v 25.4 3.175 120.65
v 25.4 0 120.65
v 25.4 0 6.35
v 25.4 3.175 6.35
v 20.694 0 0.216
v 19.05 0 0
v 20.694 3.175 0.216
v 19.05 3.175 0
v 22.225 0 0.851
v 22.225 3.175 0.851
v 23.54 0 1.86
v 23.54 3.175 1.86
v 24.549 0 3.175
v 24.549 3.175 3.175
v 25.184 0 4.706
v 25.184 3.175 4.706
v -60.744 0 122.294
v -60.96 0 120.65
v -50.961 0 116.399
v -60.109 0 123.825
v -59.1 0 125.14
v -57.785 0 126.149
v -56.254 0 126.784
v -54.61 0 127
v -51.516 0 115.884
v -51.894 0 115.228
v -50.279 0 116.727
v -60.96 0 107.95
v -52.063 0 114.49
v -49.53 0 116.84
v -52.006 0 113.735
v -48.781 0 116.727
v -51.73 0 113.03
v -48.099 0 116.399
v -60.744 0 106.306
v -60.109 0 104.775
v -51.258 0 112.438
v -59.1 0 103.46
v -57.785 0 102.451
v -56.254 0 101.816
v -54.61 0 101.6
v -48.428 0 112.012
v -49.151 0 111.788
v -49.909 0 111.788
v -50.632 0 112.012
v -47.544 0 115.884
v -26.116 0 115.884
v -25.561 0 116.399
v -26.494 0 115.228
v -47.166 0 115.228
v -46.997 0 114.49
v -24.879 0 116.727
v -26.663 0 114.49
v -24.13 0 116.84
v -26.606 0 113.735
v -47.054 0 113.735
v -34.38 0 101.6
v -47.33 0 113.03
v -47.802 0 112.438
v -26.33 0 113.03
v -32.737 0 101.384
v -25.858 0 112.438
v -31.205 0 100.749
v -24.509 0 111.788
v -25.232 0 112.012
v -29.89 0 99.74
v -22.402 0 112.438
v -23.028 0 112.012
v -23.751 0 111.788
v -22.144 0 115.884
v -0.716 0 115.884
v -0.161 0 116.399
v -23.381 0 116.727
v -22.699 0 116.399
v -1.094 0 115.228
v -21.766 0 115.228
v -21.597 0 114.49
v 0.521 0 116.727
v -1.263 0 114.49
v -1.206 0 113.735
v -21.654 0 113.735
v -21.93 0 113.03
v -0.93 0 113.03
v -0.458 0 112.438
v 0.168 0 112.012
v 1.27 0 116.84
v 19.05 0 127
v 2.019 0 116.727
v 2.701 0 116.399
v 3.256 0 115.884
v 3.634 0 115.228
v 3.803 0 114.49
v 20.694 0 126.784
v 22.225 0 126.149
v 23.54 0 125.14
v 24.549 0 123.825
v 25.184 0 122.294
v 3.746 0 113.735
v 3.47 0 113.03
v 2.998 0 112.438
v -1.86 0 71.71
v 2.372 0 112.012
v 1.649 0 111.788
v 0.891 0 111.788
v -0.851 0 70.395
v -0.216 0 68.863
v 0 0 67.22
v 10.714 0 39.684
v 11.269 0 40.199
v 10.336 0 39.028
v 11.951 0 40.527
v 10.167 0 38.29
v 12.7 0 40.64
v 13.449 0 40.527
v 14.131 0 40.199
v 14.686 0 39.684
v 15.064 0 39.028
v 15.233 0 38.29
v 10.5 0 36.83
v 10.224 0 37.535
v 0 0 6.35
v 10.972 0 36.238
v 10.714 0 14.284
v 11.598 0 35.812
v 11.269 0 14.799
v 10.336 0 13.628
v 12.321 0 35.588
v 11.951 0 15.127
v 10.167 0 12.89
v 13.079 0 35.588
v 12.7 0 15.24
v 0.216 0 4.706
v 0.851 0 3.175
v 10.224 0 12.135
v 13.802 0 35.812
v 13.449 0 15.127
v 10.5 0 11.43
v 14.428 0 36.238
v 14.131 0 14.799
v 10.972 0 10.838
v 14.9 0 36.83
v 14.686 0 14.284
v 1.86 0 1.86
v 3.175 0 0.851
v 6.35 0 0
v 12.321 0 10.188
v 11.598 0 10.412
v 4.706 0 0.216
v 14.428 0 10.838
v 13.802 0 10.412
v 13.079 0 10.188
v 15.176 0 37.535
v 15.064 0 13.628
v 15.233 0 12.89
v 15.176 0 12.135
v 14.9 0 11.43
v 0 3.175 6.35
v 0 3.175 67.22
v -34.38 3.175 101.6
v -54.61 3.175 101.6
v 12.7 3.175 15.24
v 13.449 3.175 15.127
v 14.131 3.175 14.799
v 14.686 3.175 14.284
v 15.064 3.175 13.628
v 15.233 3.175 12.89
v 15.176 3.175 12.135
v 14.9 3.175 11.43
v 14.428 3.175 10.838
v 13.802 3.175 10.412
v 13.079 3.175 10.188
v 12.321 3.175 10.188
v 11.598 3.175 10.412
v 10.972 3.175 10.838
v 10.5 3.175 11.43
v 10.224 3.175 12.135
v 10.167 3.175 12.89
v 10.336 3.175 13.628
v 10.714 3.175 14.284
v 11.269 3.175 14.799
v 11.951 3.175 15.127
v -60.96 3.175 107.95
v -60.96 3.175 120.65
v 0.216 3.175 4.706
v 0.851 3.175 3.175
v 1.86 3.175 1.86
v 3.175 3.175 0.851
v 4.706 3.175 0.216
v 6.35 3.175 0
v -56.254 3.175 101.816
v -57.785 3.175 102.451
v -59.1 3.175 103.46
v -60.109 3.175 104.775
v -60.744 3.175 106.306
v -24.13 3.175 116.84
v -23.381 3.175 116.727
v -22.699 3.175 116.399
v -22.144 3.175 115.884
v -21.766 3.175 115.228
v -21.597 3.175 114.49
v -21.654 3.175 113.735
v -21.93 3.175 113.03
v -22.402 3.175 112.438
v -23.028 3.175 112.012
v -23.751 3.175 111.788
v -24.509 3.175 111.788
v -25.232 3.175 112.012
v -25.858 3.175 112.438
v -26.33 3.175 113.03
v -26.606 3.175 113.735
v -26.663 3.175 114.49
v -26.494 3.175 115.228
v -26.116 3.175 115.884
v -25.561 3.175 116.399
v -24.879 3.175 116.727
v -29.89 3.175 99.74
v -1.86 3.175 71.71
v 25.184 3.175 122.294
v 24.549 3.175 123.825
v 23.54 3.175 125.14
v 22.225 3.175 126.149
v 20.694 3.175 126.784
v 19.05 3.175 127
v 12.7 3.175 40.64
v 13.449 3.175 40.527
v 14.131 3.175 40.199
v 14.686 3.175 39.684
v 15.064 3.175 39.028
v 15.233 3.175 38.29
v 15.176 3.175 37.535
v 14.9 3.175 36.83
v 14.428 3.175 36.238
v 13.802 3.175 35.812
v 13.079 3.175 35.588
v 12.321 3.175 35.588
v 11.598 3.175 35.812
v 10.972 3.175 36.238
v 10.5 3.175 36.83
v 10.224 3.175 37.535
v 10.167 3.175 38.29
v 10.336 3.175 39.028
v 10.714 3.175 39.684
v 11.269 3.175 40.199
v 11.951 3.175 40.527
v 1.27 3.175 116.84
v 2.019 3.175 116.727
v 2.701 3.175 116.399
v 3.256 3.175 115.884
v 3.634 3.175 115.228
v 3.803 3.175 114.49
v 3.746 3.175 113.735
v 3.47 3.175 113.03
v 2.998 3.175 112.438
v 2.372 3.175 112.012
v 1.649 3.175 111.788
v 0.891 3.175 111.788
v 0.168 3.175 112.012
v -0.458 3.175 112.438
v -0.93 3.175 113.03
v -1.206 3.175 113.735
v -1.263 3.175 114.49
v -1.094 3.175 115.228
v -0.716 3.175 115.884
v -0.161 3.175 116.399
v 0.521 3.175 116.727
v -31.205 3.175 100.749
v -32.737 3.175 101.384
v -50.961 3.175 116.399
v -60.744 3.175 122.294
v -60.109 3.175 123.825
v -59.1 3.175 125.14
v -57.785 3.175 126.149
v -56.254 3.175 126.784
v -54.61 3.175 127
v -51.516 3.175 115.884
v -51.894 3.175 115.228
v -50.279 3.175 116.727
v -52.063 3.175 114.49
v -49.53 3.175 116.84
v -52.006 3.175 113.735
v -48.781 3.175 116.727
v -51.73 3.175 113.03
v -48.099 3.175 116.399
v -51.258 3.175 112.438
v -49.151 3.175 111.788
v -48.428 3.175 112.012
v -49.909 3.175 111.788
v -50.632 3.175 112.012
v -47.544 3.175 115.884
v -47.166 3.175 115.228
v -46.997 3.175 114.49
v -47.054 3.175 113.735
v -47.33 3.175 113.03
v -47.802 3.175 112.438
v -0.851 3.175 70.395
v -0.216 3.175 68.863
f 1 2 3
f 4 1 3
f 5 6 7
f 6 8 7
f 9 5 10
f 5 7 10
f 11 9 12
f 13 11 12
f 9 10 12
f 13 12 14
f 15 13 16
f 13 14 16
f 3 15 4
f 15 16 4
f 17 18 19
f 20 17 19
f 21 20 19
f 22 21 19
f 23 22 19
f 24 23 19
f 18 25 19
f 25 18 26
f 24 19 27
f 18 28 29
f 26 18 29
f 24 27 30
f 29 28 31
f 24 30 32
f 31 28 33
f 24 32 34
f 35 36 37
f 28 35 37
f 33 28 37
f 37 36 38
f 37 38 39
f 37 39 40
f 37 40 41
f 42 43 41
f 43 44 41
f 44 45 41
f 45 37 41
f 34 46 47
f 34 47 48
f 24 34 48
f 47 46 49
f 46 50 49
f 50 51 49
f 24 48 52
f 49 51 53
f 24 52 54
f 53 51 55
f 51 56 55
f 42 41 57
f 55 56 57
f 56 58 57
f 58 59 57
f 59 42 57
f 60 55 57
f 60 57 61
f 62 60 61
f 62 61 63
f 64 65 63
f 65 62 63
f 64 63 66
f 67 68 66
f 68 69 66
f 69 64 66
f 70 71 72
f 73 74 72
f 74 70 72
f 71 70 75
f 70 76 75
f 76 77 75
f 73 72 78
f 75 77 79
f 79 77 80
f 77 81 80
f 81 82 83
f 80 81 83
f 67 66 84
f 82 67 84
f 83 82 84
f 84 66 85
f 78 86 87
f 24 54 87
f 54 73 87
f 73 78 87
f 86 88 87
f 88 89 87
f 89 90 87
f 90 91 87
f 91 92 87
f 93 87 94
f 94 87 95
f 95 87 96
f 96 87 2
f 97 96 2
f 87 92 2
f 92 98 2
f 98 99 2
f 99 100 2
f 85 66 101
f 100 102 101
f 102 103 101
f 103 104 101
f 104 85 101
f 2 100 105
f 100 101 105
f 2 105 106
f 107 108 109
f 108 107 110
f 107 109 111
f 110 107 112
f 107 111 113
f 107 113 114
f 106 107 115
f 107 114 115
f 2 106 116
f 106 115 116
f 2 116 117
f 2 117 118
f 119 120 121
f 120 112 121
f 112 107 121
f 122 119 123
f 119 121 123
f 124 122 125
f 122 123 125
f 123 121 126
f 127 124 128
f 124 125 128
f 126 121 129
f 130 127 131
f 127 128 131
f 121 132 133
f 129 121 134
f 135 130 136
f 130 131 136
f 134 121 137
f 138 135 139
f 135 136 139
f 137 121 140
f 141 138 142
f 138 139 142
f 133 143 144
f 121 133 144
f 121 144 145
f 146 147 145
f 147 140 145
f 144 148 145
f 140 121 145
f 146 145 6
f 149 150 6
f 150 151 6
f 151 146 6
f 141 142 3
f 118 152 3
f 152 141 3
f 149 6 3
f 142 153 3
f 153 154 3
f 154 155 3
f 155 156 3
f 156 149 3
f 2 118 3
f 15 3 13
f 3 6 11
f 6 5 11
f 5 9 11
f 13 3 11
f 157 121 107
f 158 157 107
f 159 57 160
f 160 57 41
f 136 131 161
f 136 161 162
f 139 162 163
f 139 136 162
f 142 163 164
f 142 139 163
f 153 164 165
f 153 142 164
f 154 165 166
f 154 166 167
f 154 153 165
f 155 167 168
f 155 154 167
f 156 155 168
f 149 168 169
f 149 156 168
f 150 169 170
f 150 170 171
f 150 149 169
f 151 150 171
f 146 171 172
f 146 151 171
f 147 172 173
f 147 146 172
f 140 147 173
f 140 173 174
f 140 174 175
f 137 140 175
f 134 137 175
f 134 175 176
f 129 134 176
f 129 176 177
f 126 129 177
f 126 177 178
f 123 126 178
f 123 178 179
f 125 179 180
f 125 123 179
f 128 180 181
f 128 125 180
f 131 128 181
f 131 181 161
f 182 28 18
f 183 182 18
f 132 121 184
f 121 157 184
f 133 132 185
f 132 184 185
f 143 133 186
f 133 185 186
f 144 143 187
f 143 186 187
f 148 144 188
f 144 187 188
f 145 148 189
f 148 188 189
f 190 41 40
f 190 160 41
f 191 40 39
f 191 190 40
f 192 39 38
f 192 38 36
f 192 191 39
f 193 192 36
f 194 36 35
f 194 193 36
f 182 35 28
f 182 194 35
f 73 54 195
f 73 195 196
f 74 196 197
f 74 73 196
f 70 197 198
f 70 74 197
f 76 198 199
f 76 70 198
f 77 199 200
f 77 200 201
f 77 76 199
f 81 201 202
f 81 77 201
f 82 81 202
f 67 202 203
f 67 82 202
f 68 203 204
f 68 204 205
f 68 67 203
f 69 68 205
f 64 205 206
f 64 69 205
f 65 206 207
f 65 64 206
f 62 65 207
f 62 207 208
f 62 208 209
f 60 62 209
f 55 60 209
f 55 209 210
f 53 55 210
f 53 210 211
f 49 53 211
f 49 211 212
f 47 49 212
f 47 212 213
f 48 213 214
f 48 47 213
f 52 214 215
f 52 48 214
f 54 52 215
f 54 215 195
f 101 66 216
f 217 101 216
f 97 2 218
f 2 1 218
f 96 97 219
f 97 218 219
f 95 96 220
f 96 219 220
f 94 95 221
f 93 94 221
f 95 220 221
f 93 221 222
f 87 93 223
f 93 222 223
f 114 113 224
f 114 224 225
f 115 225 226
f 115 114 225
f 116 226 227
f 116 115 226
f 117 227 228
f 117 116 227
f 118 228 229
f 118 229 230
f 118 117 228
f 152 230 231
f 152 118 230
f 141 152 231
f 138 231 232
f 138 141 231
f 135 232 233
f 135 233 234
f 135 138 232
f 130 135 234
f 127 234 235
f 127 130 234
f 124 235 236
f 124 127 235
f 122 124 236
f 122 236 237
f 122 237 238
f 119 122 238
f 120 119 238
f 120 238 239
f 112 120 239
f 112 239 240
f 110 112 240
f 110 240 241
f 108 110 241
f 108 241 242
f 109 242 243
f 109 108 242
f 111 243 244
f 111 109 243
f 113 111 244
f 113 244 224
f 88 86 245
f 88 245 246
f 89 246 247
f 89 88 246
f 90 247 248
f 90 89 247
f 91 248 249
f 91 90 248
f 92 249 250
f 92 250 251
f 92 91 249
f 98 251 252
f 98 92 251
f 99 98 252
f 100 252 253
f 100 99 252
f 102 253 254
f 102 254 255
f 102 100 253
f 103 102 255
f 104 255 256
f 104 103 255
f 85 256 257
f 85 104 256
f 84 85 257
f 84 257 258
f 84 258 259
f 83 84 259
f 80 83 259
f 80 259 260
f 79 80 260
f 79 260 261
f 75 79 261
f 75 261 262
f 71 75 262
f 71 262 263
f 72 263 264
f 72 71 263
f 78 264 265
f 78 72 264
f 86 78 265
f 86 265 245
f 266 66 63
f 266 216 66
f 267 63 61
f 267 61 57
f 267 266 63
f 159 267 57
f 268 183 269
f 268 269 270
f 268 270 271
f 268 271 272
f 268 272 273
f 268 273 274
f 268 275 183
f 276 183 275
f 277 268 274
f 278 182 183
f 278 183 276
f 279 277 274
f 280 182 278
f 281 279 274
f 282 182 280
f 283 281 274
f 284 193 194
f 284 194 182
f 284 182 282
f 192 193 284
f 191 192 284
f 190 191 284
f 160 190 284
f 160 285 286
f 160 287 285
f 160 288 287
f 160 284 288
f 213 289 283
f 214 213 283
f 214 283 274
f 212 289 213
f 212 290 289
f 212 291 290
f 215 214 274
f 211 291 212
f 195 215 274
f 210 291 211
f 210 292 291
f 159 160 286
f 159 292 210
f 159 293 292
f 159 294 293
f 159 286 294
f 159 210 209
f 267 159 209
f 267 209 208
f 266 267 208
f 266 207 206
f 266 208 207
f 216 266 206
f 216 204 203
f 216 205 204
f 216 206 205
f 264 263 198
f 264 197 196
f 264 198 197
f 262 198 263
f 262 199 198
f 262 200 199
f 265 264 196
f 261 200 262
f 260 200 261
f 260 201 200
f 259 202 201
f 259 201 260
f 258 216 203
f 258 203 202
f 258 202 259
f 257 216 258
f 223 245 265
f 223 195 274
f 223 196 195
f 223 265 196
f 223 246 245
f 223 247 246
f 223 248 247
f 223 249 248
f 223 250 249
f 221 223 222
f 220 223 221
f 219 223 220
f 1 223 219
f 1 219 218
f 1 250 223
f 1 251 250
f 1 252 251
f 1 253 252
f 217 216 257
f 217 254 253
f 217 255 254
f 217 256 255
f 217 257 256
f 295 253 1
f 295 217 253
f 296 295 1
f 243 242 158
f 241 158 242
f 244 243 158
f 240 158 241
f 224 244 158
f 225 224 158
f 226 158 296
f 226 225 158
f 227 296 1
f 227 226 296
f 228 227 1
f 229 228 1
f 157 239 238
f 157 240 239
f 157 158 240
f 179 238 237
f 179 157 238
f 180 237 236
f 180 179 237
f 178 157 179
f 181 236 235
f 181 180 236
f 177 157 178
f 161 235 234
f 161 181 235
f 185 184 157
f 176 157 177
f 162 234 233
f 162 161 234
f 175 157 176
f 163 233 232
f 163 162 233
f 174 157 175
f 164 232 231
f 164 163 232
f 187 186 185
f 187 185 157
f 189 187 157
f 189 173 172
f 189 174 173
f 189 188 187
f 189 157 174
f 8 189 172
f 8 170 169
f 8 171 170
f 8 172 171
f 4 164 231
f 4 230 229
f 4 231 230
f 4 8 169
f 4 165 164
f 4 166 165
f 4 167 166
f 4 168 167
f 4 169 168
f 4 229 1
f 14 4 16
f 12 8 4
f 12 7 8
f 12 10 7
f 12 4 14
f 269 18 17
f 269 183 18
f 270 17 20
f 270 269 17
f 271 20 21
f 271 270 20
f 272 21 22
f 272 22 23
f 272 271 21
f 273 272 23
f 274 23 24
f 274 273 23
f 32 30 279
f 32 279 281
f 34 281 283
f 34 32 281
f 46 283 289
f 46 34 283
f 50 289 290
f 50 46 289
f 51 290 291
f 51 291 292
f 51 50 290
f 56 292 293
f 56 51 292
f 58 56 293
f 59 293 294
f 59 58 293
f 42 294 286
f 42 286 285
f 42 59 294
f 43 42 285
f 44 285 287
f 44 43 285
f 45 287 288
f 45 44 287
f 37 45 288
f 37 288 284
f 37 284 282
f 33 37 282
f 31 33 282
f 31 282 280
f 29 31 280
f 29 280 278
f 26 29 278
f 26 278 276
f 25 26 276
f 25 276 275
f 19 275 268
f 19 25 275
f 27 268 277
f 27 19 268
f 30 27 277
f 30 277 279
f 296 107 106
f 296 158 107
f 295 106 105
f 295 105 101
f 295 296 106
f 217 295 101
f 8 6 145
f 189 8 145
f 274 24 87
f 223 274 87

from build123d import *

# Parameters (mm, degrees)
SKETCH1_R           = 2.54
BOSS_EXTRUDE1_DEPTH = 3.175
CHAMFER1_SIZE       = 31.75
FILLET1_R           = 6.35


with BuildPart() as part:
    # Sketch1 → Boss-Extrude1 (new body)
    with BuildSketch(Plane(origin=(0, 0, 0), x_dir=(1, 0, 0), z_dir=(0, 1, 0))):
        Polygon((25.4, 0), (0, 0), (0, -101.6), (-60.96, -101.6), (-60.96, -127), (25.4, -127), align=None)
        with Locations(Location((1.27, -114.3, 0), (0, 0, 270))):
            Circle(SKETCH1_R, mode=Mode.SUBTRACT)
        with Locations(Location((12.7, -12.7, 0), (0, 0, 270))):
            Circle(SKETCH1_R, mode=Mode.SUBTRACT)
        with Locations(Location((12.7, -38.1, 0), (0, 0, 270))):
            Circle(SKETCH1_R, mode=Mode.SUBTRACT)
        with Locations(Location((-24.13, -114.3, 0), (0, 0, 270))):
            Circle(SKETCH1_R, mode=Mode.SUBTRACT)
        with Locations(Location((-49.53, -114.3, 0), (0, 0, 270))):
            Circle(SKETCH1_R, mode=Mode.SUBTRACT)
    extrude(amount=BOSS_EXTRUDE1_DEPTH)

    # Chamfer1
    chamfer1_edges = [part.edges().sort_by_distance(p)[0] for p in [
        (0, 1.5875, 101.6),
    ]]
    chamfer(chamfer1_edges, length=CHAMFER1_SIZE)

    # Fillet1
    fillet1_edges = [part.edges().sort_by_distance(p)[0] for p in [
        (-60.96, 1.5875, 101.6),
        (0, 1.5875, 0),
        (25.4, 1.5875, 0),
        (25.4, 1.5875, 127),
        (-60.96, 1.5875, 127),
        (-31.75, 1.5875, 101.6),
        (0, 1.5875, 69.85),
    ]]
    fillet(fillet1_edges, radius=FILLET1_R)


solid = part.part
